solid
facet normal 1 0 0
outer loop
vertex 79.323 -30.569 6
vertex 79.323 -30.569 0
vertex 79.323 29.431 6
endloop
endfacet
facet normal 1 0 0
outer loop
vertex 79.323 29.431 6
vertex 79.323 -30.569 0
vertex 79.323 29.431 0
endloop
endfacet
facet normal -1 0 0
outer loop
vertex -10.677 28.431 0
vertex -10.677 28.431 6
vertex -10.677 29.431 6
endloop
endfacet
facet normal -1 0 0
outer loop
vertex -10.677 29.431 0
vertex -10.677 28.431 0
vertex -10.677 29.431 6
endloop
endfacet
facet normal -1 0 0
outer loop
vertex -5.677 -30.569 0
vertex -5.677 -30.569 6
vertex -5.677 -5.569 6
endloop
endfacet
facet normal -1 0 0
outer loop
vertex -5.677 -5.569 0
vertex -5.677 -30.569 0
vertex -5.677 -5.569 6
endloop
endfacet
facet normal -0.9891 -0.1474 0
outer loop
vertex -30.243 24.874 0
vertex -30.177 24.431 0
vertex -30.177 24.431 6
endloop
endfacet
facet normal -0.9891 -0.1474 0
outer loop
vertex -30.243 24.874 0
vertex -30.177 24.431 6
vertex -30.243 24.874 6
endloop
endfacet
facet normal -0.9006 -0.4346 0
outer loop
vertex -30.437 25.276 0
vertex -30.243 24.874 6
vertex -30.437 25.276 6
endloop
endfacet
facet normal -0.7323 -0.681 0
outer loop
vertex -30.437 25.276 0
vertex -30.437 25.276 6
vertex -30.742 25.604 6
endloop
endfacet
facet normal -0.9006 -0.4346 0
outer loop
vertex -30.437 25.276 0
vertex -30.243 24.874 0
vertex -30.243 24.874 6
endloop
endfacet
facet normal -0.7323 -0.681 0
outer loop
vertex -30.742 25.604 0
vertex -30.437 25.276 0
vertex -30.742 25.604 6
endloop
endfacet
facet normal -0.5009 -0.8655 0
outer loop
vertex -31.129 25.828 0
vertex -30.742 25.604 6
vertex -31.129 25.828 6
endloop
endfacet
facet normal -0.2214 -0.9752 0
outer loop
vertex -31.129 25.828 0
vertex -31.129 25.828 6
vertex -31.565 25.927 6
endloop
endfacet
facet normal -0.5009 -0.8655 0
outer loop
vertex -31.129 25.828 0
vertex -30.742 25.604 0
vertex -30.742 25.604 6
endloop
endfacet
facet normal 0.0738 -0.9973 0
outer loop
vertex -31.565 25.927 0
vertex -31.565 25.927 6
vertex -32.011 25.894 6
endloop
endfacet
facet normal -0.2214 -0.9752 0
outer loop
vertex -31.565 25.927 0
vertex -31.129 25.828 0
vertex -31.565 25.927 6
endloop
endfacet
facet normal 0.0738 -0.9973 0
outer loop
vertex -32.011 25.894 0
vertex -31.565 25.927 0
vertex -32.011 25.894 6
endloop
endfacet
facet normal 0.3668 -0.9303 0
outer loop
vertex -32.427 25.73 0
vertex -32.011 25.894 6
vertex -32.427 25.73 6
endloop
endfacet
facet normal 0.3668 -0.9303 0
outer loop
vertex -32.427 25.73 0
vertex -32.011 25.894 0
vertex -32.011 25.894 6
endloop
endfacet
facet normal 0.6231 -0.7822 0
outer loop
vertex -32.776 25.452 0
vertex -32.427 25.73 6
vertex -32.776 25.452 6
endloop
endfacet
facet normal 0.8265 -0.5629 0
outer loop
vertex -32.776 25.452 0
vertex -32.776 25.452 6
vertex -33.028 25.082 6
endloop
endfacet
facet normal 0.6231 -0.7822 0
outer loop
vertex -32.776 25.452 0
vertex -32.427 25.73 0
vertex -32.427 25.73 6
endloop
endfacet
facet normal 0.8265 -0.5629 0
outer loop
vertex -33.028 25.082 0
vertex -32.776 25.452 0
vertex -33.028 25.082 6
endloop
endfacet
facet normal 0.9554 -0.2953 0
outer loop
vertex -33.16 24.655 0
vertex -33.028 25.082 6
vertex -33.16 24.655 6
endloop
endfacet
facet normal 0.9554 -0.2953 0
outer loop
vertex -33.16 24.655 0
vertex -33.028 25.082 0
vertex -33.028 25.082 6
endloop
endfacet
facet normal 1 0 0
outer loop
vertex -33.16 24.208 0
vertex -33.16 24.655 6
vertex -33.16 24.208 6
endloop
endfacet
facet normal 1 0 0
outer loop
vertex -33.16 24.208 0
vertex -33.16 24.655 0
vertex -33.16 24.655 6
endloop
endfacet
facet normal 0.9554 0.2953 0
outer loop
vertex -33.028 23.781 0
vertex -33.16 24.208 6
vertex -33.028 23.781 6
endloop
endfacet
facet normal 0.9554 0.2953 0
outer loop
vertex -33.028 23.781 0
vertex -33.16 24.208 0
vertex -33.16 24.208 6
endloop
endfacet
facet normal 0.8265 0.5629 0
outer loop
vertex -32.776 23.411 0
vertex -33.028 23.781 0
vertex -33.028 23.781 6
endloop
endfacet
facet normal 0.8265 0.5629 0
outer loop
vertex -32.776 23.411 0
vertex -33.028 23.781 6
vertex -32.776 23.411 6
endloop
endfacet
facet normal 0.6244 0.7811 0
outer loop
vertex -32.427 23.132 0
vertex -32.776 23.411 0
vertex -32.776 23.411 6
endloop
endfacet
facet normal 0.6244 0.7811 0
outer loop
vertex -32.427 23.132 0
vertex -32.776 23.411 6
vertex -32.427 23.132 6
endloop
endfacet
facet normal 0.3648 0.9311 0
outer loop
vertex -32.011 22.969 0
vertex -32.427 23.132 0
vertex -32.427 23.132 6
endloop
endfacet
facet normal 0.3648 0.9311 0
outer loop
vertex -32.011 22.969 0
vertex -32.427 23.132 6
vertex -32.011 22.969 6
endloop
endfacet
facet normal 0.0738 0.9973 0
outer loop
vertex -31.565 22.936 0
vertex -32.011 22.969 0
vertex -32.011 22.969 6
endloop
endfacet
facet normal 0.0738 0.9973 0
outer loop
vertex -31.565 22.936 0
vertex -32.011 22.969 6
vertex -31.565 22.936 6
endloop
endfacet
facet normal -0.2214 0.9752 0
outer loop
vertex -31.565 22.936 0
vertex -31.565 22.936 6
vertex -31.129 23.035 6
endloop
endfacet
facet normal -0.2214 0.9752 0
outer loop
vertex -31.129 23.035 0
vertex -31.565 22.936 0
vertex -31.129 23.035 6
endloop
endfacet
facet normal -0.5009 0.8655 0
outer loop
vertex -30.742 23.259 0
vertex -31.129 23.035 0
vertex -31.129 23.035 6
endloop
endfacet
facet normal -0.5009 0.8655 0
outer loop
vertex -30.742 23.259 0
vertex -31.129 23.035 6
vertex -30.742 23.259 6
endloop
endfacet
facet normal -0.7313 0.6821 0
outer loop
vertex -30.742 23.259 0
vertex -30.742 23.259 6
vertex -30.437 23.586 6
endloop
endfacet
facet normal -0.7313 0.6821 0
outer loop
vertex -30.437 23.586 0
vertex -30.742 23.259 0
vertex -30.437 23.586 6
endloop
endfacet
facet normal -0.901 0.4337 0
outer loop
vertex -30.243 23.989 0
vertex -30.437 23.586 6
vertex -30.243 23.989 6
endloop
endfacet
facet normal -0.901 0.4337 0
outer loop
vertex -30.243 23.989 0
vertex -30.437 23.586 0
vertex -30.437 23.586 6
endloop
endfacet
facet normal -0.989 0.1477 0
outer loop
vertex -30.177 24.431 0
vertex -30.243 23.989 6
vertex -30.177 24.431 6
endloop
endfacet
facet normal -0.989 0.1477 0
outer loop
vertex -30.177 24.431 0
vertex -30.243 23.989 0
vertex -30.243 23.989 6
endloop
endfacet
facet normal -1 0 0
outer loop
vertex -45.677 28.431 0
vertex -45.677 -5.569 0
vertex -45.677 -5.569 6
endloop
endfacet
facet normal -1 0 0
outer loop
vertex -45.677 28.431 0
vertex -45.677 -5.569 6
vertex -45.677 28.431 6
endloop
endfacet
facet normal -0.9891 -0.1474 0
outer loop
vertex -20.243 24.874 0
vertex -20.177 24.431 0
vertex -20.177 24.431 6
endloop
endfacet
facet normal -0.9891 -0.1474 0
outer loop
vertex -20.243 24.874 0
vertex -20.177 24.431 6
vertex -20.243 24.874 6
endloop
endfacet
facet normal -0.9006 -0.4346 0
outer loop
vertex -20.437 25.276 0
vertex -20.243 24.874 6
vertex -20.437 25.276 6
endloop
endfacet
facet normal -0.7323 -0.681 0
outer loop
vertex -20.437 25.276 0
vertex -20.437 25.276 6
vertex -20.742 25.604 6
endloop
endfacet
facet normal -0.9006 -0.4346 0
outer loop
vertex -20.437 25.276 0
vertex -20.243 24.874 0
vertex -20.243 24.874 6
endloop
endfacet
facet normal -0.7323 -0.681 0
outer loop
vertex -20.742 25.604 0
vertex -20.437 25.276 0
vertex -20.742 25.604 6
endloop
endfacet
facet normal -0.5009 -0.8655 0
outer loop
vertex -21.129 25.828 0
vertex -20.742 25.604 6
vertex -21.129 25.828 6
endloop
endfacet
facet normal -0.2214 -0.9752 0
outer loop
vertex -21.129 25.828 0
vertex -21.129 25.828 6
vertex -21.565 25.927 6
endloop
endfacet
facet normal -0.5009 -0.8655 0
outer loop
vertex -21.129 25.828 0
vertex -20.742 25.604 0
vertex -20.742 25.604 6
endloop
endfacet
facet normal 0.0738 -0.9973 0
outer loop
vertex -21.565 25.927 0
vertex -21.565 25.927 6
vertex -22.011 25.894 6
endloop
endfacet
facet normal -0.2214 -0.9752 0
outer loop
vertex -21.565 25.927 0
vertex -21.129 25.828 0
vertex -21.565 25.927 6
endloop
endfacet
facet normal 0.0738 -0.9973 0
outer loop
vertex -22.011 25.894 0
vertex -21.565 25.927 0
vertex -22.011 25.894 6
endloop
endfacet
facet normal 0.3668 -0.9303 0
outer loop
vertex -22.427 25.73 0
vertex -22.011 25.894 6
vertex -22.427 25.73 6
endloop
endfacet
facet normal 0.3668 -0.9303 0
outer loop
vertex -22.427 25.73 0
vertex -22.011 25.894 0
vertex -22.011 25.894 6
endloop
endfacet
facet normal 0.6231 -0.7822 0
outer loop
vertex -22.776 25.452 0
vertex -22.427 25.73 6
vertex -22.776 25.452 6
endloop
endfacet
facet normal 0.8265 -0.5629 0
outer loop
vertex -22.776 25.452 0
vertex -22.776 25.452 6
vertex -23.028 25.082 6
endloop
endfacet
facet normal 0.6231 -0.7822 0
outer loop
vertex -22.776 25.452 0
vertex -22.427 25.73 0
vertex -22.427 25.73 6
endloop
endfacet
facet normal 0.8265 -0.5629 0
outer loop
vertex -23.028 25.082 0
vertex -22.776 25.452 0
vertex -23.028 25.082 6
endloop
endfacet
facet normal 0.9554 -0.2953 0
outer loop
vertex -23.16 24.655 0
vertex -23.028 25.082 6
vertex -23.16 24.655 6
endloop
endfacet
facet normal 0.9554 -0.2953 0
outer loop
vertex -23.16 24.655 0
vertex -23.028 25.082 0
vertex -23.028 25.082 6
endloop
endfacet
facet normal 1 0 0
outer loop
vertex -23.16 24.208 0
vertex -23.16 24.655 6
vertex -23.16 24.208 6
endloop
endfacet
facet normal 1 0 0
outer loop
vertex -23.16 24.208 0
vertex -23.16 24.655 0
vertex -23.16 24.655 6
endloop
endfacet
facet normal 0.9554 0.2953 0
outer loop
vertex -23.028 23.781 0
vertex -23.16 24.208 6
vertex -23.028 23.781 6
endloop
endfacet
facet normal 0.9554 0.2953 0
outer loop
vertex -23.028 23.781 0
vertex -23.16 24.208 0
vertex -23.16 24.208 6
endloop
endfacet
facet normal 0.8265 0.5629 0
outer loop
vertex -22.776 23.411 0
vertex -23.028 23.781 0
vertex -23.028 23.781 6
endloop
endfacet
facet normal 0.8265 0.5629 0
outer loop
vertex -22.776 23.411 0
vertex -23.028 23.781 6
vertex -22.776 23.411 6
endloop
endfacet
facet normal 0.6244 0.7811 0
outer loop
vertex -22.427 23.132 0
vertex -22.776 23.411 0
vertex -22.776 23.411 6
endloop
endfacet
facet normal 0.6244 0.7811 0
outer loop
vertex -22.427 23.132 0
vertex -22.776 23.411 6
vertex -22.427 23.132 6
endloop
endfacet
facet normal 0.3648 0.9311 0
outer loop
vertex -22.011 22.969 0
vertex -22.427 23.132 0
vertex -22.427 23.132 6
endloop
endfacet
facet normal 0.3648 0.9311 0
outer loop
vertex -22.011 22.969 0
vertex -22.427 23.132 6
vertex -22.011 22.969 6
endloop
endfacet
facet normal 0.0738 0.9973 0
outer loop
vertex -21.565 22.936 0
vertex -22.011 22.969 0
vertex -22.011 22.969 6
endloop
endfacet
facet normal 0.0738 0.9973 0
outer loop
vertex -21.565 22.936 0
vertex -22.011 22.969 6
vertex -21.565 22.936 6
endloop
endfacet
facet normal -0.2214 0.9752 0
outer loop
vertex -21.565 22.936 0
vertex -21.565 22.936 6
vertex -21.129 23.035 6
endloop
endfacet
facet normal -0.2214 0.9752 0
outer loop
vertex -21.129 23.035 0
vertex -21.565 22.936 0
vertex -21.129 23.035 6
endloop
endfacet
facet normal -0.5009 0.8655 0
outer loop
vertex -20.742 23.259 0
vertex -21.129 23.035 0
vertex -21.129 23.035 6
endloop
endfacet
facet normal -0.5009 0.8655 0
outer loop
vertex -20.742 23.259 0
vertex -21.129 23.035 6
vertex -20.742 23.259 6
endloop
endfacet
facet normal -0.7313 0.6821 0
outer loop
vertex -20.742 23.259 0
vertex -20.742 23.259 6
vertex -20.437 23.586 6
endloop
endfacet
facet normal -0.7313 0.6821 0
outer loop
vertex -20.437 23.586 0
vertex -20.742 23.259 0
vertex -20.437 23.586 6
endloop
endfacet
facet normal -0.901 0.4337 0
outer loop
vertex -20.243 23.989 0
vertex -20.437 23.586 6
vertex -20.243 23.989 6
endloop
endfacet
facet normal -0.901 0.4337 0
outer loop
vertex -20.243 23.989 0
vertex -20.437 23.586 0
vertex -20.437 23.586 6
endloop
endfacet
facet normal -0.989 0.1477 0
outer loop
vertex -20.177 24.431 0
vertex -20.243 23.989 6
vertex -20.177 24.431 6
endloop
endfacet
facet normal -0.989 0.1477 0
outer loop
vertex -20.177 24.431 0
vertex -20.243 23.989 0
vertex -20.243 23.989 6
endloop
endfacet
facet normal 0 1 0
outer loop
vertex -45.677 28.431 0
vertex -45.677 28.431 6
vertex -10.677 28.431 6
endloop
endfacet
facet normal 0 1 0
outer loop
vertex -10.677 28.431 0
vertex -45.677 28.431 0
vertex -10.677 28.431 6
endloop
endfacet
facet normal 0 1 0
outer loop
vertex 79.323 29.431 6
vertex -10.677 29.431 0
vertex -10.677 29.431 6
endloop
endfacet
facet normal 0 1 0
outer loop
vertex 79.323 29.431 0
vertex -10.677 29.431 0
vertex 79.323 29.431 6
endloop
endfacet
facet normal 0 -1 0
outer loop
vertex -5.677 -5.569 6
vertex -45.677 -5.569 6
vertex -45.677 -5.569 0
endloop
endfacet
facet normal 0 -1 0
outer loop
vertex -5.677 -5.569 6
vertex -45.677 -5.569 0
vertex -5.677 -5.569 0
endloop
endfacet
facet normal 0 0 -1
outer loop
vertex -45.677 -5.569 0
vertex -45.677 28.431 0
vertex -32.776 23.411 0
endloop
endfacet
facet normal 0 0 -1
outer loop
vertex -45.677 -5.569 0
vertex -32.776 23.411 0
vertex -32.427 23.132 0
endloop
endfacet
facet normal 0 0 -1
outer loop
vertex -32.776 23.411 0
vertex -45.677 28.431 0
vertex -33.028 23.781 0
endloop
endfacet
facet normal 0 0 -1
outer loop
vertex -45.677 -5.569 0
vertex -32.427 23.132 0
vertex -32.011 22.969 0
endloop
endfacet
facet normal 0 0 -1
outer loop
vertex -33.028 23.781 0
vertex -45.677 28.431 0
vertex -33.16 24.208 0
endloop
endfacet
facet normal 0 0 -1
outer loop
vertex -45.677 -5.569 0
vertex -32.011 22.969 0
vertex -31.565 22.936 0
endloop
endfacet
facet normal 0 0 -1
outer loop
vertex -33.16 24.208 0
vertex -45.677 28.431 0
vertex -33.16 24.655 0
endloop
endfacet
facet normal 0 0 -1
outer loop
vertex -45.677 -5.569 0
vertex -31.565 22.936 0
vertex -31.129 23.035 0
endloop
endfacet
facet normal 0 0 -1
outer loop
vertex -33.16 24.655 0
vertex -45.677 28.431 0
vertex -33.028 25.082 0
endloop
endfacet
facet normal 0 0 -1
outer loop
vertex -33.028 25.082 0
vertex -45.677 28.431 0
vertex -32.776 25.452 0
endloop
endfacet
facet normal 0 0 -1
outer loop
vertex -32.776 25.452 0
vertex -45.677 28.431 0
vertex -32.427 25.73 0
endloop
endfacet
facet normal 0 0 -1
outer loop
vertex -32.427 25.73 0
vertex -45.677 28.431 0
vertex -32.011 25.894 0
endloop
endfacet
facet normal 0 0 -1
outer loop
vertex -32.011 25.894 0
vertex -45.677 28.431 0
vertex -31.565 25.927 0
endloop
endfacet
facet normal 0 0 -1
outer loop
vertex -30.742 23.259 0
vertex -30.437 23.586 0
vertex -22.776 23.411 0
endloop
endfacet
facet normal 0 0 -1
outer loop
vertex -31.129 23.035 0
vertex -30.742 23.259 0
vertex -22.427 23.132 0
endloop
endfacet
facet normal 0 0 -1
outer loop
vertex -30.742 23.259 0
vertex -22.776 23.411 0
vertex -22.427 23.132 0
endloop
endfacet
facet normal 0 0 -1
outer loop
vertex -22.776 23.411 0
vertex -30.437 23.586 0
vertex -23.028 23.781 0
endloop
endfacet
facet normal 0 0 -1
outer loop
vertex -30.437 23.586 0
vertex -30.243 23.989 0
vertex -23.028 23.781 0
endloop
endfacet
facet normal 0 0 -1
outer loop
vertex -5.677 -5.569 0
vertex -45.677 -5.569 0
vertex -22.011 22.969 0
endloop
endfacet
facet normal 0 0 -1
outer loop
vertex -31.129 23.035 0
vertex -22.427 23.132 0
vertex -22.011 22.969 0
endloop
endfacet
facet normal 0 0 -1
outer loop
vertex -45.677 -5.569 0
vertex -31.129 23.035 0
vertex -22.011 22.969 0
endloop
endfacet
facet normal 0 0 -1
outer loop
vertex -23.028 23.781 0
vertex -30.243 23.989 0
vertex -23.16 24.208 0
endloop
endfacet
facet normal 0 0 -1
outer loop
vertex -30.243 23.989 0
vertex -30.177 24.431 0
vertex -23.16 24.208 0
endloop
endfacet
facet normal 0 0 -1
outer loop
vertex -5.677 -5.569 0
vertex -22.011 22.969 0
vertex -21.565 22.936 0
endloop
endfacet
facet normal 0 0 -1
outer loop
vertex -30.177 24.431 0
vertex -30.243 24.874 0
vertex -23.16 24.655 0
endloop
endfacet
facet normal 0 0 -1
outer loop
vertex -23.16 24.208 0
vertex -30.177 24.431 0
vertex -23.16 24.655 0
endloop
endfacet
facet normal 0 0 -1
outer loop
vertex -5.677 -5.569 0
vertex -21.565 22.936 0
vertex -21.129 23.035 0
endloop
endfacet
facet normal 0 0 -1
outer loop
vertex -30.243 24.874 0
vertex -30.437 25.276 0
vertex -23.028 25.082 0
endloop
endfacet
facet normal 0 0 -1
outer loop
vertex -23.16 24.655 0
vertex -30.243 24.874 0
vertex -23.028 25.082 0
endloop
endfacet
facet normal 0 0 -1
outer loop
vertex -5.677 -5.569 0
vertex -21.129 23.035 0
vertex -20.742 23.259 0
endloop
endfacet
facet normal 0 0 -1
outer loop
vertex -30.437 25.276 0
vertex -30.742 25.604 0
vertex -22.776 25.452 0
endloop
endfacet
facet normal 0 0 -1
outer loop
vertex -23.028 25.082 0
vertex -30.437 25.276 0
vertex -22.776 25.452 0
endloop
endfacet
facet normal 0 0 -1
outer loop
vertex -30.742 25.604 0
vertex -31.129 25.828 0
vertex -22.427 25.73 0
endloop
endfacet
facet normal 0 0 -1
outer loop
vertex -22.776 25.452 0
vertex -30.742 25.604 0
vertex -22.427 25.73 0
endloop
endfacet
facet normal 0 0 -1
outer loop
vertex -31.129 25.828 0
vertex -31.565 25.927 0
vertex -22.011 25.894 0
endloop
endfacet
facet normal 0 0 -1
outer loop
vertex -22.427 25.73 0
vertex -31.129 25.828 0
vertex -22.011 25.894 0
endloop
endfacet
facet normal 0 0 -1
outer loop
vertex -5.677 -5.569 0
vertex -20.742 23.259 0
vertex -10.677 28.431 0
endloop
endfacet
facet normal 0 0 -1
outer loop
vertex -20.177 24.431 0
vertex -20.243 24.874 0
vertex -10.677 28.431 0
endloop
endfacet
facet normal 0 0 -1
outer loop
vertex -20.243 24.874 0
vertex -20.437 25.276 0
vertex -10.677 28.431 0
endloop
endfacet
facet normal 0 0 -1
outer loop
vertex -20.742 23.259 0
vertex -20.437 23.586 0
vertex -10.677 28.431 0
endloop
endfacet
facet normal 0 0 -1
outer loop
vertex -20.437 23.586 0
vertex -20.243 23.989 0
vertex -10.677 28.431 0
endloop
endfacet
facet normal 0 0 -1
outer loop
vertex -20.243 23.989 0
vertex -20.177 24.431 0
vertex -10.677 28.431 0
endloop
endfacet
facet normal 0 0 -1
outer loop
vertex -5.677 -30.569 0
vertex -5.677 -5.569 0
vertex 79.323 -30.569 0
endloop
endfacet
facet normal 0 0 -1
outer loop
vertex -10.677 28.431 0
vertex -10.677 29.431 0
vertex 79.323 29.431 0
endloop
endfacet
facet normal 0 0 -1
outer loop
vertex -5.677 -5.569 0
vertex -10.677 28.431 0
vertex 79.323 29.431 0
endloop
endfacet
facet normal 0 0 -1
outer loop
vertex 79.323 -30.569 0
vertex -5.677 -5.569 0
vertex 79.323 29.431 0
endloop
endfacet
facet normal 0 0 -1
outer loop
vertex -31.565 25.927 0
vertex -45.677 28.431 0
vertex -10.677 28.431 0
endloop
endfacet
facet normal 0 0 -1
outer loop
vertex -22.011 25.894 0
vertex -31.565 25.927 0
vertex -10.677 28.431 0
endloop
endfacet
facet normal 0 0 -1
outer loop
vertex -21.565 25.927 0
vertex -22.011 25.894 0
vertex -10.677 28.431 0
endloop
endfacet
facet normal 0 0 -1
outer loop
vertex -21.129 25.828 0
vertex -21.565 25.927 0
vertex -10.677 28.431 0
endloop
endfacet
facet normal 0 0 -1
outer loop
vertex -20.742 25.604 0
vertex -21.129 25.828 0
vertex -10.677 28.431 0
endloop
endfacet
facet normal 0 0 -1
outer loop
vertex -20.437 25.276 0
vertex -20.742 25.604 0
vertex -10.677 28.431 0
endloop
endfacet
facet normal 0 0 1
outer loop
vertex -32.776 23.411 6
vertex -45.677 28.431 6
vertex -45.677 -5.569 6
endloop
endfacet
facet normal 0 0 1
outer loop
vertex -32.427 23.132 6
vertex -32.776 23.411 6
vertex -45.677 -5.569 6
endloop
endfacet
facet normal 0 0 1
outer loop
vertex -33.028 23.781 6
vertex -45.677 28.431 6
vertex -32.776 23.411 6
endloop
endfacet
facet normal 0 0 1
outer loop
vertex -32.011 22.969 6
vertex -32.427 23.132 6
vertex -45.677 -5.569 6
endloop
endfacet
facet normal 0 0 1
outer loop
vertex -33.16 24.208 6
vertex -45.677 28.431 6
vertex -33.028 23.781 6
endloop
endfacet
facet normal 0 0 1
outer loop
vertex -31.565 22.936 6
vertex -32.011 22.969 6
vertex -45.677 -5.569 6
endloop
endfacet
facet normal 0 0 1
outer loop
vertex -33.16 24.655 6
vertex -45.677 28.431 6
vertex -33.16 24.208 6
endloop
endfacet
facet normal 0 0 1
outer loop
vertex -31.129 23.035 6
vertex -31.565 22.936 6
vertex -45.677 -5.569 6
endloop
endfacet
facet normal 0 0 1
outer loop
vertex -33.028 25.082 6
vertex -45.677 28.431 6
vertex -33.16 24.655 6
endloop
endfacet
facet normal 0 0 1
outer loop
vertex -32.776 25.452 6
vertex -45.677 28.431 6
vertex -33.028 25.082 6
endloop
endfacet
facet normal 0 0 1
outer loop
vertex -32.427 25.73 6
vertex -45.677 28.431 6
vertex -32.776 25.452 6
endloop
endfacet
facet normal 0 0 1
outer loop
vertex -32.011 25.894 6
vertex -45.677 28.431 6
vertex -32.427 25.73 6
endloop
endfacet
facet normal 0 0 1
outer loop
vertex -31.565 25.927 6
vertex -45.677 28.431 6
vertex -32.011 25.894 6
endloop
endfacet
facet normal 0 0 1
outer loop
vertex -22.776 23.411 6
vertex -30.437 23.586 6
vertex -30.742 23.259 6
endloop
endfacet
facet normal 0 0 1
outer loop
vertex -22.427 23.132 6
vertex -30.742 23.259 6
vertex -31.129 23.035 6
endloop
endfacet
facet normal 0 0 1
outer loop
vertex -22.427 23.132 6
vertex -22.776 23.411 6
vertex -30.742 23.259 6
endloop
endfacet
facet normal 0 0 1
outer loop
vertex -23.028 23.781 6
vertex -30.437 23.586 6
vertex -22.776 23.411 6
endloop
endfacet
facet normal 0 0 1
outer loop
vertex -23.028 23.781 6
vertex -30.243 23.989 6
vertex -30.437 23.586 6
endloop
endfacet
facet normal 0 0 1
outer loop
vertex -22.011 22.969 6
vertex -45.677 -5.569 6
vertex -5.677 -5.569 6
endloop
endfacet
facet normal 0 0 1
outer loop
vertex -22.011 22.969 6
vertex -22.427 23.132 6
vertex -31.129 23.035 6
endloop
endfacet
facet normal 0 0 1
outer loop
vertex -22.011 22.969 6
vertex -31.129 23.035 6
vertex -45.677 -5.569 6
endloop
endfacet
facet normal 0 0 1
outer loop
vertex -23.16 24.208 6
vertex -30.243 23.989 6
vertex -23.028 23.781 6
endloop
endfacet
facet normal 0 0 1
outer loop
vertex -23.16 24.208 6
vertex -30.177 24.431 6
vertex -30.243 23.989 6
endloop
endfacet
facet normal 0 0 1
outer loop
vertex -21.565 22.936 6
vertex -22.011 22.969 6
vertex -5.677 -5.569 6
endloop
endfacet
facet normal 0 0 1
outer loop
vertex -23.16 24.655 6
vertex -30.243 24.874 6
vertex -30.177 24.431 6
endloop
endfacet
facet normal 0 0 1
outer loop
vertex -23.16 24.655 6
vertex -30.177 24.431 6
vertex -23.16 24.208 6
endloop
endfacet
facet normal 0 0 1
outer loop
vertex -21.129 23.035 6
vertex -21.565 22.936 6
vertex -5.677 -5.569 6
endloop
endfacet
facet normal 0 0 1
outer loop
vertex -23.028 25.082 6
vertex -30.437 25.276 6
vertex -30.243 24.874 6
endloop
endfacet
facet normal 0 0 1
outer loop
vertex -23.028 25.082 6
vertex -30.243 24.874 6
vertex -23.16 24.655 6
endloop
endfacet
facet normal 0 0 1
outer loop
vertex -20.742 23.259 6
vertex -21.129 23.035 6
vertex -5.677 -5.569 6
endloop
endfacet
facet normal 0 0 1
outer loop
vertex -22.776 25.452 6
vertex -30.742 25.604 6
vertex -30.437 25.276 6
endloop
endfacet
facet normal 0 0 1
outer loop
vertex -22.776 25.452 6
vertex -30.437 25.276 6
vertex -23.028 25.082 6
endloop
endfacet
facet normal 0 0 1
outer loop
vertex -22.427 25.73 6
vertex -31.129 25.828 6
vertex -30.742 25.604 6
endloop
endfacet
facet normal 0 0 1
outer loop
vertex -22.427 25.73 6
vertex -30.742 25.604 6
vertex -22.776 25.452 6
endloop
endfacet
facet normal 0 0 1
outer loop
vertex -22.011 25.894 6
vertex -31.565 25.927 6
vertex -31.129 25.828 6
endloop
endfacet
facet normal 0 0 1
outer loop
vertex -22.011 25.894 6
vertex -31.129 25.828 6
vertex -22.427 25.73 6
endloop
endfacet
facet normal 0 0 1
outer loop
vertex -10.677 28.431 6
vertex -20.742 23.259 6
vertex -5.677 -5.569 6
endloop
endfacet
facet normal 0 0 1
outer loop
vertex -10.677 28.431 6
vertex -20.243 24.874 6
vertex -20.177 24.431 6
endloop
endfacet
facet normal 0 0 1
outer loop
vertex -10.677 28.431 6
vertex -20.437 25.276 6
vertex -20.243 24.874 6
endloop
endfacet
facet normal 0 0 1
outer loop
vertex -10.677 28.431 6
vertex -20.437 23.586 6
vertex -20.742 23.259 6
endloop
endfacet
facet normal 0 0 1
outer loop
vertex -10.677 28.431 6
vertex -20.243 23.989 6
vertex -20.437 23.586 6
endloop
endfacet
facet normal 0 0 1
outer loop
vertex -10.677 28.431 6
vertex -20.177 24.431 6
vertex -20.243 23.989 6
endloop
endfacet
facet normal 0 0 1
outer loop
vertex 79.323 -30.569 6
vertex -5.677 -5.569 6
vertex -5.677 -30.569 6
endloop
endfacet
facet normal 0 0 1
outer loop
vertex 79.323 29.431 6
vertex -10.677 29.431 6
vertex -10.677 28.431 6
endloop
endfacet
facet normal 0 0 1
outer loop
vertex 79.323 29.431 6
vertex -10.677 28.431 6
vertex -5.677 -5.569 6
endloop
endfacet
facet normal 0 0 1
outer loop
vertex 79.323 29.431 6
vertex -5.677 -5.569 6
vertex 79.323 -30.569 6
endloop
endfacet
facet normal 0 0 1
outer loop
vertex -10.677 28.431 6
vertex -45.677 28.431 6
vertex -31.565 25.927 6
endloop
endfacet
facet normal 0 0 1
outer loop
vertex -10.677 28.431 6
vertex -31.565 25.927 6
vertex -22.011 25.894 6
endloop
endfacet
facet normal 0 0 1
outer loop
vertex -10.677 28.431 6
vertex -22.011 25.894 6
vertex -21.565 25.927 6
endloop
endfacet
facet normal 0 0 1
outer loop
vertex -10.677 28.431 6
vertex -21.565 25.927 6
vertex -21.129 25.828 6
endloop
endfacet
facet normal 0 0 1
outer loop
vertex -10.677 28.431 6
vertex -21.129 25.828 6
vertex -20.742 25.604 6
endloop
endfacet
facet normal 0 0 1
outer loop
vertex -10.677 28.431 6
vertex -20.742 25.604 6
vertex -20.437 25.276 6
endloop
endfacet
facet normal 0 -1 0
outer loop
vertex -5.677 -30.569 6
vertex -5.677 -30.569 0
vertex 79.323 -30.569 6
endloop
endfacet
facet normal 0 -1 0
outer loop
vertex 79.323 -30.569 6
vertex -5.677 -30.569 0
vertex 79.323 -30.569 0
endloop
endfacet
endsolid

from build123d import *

# Parameters (mm, degrees)
ESQUISSE1_W             = 125
ESQUISSE1_H             = 60
ESQUISSE1_R             = 1.5
BOSS_EXTRU_1_DEPTH      = 6
ESQUISSE2_W             = 40
ESQUISSE2_H             = 25
ESQUISSE2_W_2           = 35
ESQUISSE2_H_2           = 1
ENL_V_MAT_EXTRU_1_DEPTH = 6


with BuildPart() as part:
    # Esquisse1 → Boss.-Extru.1 (new body)
    with BuildSketch(Plane.XY):
        with Locations((16.823229439, -0.568627451)):
            Rectangle(ESQUISSE1_W, ESQUISSE1_H)
        with Locations((-31.676770561, 24.431372549)):
            Circle(ESQUISSE1_R, mode=Mode.SUBTRACT)
        with Locations((-21.676770561, 24.431372549)):
            Circle(ESQUISSE1_R, mode=Mode.SUBTRACT)
    extrude(amount=BOSS_EXTRU_1_DEPTH)

    # Esquisse2 → Enlèv. mat.-Extru.1 (cut)
    with BuildSketch(Plane.XY.offset(6)):
        with Locations((-25.676770561, -18.068627451)):
            Rectangle(ESQUISSE2_W, ESQUISSE2_H)
        with Locations((-28.176770561, 28.931372549)):
            Rectangle(ESQUISSE2_W_2, ESQUISSE2_H_2)
    extrude(amount=-ENL_V_MAT_EXTRU_1_DEPTH, mode=Mode.SUBTRACT)


solid = part.part
